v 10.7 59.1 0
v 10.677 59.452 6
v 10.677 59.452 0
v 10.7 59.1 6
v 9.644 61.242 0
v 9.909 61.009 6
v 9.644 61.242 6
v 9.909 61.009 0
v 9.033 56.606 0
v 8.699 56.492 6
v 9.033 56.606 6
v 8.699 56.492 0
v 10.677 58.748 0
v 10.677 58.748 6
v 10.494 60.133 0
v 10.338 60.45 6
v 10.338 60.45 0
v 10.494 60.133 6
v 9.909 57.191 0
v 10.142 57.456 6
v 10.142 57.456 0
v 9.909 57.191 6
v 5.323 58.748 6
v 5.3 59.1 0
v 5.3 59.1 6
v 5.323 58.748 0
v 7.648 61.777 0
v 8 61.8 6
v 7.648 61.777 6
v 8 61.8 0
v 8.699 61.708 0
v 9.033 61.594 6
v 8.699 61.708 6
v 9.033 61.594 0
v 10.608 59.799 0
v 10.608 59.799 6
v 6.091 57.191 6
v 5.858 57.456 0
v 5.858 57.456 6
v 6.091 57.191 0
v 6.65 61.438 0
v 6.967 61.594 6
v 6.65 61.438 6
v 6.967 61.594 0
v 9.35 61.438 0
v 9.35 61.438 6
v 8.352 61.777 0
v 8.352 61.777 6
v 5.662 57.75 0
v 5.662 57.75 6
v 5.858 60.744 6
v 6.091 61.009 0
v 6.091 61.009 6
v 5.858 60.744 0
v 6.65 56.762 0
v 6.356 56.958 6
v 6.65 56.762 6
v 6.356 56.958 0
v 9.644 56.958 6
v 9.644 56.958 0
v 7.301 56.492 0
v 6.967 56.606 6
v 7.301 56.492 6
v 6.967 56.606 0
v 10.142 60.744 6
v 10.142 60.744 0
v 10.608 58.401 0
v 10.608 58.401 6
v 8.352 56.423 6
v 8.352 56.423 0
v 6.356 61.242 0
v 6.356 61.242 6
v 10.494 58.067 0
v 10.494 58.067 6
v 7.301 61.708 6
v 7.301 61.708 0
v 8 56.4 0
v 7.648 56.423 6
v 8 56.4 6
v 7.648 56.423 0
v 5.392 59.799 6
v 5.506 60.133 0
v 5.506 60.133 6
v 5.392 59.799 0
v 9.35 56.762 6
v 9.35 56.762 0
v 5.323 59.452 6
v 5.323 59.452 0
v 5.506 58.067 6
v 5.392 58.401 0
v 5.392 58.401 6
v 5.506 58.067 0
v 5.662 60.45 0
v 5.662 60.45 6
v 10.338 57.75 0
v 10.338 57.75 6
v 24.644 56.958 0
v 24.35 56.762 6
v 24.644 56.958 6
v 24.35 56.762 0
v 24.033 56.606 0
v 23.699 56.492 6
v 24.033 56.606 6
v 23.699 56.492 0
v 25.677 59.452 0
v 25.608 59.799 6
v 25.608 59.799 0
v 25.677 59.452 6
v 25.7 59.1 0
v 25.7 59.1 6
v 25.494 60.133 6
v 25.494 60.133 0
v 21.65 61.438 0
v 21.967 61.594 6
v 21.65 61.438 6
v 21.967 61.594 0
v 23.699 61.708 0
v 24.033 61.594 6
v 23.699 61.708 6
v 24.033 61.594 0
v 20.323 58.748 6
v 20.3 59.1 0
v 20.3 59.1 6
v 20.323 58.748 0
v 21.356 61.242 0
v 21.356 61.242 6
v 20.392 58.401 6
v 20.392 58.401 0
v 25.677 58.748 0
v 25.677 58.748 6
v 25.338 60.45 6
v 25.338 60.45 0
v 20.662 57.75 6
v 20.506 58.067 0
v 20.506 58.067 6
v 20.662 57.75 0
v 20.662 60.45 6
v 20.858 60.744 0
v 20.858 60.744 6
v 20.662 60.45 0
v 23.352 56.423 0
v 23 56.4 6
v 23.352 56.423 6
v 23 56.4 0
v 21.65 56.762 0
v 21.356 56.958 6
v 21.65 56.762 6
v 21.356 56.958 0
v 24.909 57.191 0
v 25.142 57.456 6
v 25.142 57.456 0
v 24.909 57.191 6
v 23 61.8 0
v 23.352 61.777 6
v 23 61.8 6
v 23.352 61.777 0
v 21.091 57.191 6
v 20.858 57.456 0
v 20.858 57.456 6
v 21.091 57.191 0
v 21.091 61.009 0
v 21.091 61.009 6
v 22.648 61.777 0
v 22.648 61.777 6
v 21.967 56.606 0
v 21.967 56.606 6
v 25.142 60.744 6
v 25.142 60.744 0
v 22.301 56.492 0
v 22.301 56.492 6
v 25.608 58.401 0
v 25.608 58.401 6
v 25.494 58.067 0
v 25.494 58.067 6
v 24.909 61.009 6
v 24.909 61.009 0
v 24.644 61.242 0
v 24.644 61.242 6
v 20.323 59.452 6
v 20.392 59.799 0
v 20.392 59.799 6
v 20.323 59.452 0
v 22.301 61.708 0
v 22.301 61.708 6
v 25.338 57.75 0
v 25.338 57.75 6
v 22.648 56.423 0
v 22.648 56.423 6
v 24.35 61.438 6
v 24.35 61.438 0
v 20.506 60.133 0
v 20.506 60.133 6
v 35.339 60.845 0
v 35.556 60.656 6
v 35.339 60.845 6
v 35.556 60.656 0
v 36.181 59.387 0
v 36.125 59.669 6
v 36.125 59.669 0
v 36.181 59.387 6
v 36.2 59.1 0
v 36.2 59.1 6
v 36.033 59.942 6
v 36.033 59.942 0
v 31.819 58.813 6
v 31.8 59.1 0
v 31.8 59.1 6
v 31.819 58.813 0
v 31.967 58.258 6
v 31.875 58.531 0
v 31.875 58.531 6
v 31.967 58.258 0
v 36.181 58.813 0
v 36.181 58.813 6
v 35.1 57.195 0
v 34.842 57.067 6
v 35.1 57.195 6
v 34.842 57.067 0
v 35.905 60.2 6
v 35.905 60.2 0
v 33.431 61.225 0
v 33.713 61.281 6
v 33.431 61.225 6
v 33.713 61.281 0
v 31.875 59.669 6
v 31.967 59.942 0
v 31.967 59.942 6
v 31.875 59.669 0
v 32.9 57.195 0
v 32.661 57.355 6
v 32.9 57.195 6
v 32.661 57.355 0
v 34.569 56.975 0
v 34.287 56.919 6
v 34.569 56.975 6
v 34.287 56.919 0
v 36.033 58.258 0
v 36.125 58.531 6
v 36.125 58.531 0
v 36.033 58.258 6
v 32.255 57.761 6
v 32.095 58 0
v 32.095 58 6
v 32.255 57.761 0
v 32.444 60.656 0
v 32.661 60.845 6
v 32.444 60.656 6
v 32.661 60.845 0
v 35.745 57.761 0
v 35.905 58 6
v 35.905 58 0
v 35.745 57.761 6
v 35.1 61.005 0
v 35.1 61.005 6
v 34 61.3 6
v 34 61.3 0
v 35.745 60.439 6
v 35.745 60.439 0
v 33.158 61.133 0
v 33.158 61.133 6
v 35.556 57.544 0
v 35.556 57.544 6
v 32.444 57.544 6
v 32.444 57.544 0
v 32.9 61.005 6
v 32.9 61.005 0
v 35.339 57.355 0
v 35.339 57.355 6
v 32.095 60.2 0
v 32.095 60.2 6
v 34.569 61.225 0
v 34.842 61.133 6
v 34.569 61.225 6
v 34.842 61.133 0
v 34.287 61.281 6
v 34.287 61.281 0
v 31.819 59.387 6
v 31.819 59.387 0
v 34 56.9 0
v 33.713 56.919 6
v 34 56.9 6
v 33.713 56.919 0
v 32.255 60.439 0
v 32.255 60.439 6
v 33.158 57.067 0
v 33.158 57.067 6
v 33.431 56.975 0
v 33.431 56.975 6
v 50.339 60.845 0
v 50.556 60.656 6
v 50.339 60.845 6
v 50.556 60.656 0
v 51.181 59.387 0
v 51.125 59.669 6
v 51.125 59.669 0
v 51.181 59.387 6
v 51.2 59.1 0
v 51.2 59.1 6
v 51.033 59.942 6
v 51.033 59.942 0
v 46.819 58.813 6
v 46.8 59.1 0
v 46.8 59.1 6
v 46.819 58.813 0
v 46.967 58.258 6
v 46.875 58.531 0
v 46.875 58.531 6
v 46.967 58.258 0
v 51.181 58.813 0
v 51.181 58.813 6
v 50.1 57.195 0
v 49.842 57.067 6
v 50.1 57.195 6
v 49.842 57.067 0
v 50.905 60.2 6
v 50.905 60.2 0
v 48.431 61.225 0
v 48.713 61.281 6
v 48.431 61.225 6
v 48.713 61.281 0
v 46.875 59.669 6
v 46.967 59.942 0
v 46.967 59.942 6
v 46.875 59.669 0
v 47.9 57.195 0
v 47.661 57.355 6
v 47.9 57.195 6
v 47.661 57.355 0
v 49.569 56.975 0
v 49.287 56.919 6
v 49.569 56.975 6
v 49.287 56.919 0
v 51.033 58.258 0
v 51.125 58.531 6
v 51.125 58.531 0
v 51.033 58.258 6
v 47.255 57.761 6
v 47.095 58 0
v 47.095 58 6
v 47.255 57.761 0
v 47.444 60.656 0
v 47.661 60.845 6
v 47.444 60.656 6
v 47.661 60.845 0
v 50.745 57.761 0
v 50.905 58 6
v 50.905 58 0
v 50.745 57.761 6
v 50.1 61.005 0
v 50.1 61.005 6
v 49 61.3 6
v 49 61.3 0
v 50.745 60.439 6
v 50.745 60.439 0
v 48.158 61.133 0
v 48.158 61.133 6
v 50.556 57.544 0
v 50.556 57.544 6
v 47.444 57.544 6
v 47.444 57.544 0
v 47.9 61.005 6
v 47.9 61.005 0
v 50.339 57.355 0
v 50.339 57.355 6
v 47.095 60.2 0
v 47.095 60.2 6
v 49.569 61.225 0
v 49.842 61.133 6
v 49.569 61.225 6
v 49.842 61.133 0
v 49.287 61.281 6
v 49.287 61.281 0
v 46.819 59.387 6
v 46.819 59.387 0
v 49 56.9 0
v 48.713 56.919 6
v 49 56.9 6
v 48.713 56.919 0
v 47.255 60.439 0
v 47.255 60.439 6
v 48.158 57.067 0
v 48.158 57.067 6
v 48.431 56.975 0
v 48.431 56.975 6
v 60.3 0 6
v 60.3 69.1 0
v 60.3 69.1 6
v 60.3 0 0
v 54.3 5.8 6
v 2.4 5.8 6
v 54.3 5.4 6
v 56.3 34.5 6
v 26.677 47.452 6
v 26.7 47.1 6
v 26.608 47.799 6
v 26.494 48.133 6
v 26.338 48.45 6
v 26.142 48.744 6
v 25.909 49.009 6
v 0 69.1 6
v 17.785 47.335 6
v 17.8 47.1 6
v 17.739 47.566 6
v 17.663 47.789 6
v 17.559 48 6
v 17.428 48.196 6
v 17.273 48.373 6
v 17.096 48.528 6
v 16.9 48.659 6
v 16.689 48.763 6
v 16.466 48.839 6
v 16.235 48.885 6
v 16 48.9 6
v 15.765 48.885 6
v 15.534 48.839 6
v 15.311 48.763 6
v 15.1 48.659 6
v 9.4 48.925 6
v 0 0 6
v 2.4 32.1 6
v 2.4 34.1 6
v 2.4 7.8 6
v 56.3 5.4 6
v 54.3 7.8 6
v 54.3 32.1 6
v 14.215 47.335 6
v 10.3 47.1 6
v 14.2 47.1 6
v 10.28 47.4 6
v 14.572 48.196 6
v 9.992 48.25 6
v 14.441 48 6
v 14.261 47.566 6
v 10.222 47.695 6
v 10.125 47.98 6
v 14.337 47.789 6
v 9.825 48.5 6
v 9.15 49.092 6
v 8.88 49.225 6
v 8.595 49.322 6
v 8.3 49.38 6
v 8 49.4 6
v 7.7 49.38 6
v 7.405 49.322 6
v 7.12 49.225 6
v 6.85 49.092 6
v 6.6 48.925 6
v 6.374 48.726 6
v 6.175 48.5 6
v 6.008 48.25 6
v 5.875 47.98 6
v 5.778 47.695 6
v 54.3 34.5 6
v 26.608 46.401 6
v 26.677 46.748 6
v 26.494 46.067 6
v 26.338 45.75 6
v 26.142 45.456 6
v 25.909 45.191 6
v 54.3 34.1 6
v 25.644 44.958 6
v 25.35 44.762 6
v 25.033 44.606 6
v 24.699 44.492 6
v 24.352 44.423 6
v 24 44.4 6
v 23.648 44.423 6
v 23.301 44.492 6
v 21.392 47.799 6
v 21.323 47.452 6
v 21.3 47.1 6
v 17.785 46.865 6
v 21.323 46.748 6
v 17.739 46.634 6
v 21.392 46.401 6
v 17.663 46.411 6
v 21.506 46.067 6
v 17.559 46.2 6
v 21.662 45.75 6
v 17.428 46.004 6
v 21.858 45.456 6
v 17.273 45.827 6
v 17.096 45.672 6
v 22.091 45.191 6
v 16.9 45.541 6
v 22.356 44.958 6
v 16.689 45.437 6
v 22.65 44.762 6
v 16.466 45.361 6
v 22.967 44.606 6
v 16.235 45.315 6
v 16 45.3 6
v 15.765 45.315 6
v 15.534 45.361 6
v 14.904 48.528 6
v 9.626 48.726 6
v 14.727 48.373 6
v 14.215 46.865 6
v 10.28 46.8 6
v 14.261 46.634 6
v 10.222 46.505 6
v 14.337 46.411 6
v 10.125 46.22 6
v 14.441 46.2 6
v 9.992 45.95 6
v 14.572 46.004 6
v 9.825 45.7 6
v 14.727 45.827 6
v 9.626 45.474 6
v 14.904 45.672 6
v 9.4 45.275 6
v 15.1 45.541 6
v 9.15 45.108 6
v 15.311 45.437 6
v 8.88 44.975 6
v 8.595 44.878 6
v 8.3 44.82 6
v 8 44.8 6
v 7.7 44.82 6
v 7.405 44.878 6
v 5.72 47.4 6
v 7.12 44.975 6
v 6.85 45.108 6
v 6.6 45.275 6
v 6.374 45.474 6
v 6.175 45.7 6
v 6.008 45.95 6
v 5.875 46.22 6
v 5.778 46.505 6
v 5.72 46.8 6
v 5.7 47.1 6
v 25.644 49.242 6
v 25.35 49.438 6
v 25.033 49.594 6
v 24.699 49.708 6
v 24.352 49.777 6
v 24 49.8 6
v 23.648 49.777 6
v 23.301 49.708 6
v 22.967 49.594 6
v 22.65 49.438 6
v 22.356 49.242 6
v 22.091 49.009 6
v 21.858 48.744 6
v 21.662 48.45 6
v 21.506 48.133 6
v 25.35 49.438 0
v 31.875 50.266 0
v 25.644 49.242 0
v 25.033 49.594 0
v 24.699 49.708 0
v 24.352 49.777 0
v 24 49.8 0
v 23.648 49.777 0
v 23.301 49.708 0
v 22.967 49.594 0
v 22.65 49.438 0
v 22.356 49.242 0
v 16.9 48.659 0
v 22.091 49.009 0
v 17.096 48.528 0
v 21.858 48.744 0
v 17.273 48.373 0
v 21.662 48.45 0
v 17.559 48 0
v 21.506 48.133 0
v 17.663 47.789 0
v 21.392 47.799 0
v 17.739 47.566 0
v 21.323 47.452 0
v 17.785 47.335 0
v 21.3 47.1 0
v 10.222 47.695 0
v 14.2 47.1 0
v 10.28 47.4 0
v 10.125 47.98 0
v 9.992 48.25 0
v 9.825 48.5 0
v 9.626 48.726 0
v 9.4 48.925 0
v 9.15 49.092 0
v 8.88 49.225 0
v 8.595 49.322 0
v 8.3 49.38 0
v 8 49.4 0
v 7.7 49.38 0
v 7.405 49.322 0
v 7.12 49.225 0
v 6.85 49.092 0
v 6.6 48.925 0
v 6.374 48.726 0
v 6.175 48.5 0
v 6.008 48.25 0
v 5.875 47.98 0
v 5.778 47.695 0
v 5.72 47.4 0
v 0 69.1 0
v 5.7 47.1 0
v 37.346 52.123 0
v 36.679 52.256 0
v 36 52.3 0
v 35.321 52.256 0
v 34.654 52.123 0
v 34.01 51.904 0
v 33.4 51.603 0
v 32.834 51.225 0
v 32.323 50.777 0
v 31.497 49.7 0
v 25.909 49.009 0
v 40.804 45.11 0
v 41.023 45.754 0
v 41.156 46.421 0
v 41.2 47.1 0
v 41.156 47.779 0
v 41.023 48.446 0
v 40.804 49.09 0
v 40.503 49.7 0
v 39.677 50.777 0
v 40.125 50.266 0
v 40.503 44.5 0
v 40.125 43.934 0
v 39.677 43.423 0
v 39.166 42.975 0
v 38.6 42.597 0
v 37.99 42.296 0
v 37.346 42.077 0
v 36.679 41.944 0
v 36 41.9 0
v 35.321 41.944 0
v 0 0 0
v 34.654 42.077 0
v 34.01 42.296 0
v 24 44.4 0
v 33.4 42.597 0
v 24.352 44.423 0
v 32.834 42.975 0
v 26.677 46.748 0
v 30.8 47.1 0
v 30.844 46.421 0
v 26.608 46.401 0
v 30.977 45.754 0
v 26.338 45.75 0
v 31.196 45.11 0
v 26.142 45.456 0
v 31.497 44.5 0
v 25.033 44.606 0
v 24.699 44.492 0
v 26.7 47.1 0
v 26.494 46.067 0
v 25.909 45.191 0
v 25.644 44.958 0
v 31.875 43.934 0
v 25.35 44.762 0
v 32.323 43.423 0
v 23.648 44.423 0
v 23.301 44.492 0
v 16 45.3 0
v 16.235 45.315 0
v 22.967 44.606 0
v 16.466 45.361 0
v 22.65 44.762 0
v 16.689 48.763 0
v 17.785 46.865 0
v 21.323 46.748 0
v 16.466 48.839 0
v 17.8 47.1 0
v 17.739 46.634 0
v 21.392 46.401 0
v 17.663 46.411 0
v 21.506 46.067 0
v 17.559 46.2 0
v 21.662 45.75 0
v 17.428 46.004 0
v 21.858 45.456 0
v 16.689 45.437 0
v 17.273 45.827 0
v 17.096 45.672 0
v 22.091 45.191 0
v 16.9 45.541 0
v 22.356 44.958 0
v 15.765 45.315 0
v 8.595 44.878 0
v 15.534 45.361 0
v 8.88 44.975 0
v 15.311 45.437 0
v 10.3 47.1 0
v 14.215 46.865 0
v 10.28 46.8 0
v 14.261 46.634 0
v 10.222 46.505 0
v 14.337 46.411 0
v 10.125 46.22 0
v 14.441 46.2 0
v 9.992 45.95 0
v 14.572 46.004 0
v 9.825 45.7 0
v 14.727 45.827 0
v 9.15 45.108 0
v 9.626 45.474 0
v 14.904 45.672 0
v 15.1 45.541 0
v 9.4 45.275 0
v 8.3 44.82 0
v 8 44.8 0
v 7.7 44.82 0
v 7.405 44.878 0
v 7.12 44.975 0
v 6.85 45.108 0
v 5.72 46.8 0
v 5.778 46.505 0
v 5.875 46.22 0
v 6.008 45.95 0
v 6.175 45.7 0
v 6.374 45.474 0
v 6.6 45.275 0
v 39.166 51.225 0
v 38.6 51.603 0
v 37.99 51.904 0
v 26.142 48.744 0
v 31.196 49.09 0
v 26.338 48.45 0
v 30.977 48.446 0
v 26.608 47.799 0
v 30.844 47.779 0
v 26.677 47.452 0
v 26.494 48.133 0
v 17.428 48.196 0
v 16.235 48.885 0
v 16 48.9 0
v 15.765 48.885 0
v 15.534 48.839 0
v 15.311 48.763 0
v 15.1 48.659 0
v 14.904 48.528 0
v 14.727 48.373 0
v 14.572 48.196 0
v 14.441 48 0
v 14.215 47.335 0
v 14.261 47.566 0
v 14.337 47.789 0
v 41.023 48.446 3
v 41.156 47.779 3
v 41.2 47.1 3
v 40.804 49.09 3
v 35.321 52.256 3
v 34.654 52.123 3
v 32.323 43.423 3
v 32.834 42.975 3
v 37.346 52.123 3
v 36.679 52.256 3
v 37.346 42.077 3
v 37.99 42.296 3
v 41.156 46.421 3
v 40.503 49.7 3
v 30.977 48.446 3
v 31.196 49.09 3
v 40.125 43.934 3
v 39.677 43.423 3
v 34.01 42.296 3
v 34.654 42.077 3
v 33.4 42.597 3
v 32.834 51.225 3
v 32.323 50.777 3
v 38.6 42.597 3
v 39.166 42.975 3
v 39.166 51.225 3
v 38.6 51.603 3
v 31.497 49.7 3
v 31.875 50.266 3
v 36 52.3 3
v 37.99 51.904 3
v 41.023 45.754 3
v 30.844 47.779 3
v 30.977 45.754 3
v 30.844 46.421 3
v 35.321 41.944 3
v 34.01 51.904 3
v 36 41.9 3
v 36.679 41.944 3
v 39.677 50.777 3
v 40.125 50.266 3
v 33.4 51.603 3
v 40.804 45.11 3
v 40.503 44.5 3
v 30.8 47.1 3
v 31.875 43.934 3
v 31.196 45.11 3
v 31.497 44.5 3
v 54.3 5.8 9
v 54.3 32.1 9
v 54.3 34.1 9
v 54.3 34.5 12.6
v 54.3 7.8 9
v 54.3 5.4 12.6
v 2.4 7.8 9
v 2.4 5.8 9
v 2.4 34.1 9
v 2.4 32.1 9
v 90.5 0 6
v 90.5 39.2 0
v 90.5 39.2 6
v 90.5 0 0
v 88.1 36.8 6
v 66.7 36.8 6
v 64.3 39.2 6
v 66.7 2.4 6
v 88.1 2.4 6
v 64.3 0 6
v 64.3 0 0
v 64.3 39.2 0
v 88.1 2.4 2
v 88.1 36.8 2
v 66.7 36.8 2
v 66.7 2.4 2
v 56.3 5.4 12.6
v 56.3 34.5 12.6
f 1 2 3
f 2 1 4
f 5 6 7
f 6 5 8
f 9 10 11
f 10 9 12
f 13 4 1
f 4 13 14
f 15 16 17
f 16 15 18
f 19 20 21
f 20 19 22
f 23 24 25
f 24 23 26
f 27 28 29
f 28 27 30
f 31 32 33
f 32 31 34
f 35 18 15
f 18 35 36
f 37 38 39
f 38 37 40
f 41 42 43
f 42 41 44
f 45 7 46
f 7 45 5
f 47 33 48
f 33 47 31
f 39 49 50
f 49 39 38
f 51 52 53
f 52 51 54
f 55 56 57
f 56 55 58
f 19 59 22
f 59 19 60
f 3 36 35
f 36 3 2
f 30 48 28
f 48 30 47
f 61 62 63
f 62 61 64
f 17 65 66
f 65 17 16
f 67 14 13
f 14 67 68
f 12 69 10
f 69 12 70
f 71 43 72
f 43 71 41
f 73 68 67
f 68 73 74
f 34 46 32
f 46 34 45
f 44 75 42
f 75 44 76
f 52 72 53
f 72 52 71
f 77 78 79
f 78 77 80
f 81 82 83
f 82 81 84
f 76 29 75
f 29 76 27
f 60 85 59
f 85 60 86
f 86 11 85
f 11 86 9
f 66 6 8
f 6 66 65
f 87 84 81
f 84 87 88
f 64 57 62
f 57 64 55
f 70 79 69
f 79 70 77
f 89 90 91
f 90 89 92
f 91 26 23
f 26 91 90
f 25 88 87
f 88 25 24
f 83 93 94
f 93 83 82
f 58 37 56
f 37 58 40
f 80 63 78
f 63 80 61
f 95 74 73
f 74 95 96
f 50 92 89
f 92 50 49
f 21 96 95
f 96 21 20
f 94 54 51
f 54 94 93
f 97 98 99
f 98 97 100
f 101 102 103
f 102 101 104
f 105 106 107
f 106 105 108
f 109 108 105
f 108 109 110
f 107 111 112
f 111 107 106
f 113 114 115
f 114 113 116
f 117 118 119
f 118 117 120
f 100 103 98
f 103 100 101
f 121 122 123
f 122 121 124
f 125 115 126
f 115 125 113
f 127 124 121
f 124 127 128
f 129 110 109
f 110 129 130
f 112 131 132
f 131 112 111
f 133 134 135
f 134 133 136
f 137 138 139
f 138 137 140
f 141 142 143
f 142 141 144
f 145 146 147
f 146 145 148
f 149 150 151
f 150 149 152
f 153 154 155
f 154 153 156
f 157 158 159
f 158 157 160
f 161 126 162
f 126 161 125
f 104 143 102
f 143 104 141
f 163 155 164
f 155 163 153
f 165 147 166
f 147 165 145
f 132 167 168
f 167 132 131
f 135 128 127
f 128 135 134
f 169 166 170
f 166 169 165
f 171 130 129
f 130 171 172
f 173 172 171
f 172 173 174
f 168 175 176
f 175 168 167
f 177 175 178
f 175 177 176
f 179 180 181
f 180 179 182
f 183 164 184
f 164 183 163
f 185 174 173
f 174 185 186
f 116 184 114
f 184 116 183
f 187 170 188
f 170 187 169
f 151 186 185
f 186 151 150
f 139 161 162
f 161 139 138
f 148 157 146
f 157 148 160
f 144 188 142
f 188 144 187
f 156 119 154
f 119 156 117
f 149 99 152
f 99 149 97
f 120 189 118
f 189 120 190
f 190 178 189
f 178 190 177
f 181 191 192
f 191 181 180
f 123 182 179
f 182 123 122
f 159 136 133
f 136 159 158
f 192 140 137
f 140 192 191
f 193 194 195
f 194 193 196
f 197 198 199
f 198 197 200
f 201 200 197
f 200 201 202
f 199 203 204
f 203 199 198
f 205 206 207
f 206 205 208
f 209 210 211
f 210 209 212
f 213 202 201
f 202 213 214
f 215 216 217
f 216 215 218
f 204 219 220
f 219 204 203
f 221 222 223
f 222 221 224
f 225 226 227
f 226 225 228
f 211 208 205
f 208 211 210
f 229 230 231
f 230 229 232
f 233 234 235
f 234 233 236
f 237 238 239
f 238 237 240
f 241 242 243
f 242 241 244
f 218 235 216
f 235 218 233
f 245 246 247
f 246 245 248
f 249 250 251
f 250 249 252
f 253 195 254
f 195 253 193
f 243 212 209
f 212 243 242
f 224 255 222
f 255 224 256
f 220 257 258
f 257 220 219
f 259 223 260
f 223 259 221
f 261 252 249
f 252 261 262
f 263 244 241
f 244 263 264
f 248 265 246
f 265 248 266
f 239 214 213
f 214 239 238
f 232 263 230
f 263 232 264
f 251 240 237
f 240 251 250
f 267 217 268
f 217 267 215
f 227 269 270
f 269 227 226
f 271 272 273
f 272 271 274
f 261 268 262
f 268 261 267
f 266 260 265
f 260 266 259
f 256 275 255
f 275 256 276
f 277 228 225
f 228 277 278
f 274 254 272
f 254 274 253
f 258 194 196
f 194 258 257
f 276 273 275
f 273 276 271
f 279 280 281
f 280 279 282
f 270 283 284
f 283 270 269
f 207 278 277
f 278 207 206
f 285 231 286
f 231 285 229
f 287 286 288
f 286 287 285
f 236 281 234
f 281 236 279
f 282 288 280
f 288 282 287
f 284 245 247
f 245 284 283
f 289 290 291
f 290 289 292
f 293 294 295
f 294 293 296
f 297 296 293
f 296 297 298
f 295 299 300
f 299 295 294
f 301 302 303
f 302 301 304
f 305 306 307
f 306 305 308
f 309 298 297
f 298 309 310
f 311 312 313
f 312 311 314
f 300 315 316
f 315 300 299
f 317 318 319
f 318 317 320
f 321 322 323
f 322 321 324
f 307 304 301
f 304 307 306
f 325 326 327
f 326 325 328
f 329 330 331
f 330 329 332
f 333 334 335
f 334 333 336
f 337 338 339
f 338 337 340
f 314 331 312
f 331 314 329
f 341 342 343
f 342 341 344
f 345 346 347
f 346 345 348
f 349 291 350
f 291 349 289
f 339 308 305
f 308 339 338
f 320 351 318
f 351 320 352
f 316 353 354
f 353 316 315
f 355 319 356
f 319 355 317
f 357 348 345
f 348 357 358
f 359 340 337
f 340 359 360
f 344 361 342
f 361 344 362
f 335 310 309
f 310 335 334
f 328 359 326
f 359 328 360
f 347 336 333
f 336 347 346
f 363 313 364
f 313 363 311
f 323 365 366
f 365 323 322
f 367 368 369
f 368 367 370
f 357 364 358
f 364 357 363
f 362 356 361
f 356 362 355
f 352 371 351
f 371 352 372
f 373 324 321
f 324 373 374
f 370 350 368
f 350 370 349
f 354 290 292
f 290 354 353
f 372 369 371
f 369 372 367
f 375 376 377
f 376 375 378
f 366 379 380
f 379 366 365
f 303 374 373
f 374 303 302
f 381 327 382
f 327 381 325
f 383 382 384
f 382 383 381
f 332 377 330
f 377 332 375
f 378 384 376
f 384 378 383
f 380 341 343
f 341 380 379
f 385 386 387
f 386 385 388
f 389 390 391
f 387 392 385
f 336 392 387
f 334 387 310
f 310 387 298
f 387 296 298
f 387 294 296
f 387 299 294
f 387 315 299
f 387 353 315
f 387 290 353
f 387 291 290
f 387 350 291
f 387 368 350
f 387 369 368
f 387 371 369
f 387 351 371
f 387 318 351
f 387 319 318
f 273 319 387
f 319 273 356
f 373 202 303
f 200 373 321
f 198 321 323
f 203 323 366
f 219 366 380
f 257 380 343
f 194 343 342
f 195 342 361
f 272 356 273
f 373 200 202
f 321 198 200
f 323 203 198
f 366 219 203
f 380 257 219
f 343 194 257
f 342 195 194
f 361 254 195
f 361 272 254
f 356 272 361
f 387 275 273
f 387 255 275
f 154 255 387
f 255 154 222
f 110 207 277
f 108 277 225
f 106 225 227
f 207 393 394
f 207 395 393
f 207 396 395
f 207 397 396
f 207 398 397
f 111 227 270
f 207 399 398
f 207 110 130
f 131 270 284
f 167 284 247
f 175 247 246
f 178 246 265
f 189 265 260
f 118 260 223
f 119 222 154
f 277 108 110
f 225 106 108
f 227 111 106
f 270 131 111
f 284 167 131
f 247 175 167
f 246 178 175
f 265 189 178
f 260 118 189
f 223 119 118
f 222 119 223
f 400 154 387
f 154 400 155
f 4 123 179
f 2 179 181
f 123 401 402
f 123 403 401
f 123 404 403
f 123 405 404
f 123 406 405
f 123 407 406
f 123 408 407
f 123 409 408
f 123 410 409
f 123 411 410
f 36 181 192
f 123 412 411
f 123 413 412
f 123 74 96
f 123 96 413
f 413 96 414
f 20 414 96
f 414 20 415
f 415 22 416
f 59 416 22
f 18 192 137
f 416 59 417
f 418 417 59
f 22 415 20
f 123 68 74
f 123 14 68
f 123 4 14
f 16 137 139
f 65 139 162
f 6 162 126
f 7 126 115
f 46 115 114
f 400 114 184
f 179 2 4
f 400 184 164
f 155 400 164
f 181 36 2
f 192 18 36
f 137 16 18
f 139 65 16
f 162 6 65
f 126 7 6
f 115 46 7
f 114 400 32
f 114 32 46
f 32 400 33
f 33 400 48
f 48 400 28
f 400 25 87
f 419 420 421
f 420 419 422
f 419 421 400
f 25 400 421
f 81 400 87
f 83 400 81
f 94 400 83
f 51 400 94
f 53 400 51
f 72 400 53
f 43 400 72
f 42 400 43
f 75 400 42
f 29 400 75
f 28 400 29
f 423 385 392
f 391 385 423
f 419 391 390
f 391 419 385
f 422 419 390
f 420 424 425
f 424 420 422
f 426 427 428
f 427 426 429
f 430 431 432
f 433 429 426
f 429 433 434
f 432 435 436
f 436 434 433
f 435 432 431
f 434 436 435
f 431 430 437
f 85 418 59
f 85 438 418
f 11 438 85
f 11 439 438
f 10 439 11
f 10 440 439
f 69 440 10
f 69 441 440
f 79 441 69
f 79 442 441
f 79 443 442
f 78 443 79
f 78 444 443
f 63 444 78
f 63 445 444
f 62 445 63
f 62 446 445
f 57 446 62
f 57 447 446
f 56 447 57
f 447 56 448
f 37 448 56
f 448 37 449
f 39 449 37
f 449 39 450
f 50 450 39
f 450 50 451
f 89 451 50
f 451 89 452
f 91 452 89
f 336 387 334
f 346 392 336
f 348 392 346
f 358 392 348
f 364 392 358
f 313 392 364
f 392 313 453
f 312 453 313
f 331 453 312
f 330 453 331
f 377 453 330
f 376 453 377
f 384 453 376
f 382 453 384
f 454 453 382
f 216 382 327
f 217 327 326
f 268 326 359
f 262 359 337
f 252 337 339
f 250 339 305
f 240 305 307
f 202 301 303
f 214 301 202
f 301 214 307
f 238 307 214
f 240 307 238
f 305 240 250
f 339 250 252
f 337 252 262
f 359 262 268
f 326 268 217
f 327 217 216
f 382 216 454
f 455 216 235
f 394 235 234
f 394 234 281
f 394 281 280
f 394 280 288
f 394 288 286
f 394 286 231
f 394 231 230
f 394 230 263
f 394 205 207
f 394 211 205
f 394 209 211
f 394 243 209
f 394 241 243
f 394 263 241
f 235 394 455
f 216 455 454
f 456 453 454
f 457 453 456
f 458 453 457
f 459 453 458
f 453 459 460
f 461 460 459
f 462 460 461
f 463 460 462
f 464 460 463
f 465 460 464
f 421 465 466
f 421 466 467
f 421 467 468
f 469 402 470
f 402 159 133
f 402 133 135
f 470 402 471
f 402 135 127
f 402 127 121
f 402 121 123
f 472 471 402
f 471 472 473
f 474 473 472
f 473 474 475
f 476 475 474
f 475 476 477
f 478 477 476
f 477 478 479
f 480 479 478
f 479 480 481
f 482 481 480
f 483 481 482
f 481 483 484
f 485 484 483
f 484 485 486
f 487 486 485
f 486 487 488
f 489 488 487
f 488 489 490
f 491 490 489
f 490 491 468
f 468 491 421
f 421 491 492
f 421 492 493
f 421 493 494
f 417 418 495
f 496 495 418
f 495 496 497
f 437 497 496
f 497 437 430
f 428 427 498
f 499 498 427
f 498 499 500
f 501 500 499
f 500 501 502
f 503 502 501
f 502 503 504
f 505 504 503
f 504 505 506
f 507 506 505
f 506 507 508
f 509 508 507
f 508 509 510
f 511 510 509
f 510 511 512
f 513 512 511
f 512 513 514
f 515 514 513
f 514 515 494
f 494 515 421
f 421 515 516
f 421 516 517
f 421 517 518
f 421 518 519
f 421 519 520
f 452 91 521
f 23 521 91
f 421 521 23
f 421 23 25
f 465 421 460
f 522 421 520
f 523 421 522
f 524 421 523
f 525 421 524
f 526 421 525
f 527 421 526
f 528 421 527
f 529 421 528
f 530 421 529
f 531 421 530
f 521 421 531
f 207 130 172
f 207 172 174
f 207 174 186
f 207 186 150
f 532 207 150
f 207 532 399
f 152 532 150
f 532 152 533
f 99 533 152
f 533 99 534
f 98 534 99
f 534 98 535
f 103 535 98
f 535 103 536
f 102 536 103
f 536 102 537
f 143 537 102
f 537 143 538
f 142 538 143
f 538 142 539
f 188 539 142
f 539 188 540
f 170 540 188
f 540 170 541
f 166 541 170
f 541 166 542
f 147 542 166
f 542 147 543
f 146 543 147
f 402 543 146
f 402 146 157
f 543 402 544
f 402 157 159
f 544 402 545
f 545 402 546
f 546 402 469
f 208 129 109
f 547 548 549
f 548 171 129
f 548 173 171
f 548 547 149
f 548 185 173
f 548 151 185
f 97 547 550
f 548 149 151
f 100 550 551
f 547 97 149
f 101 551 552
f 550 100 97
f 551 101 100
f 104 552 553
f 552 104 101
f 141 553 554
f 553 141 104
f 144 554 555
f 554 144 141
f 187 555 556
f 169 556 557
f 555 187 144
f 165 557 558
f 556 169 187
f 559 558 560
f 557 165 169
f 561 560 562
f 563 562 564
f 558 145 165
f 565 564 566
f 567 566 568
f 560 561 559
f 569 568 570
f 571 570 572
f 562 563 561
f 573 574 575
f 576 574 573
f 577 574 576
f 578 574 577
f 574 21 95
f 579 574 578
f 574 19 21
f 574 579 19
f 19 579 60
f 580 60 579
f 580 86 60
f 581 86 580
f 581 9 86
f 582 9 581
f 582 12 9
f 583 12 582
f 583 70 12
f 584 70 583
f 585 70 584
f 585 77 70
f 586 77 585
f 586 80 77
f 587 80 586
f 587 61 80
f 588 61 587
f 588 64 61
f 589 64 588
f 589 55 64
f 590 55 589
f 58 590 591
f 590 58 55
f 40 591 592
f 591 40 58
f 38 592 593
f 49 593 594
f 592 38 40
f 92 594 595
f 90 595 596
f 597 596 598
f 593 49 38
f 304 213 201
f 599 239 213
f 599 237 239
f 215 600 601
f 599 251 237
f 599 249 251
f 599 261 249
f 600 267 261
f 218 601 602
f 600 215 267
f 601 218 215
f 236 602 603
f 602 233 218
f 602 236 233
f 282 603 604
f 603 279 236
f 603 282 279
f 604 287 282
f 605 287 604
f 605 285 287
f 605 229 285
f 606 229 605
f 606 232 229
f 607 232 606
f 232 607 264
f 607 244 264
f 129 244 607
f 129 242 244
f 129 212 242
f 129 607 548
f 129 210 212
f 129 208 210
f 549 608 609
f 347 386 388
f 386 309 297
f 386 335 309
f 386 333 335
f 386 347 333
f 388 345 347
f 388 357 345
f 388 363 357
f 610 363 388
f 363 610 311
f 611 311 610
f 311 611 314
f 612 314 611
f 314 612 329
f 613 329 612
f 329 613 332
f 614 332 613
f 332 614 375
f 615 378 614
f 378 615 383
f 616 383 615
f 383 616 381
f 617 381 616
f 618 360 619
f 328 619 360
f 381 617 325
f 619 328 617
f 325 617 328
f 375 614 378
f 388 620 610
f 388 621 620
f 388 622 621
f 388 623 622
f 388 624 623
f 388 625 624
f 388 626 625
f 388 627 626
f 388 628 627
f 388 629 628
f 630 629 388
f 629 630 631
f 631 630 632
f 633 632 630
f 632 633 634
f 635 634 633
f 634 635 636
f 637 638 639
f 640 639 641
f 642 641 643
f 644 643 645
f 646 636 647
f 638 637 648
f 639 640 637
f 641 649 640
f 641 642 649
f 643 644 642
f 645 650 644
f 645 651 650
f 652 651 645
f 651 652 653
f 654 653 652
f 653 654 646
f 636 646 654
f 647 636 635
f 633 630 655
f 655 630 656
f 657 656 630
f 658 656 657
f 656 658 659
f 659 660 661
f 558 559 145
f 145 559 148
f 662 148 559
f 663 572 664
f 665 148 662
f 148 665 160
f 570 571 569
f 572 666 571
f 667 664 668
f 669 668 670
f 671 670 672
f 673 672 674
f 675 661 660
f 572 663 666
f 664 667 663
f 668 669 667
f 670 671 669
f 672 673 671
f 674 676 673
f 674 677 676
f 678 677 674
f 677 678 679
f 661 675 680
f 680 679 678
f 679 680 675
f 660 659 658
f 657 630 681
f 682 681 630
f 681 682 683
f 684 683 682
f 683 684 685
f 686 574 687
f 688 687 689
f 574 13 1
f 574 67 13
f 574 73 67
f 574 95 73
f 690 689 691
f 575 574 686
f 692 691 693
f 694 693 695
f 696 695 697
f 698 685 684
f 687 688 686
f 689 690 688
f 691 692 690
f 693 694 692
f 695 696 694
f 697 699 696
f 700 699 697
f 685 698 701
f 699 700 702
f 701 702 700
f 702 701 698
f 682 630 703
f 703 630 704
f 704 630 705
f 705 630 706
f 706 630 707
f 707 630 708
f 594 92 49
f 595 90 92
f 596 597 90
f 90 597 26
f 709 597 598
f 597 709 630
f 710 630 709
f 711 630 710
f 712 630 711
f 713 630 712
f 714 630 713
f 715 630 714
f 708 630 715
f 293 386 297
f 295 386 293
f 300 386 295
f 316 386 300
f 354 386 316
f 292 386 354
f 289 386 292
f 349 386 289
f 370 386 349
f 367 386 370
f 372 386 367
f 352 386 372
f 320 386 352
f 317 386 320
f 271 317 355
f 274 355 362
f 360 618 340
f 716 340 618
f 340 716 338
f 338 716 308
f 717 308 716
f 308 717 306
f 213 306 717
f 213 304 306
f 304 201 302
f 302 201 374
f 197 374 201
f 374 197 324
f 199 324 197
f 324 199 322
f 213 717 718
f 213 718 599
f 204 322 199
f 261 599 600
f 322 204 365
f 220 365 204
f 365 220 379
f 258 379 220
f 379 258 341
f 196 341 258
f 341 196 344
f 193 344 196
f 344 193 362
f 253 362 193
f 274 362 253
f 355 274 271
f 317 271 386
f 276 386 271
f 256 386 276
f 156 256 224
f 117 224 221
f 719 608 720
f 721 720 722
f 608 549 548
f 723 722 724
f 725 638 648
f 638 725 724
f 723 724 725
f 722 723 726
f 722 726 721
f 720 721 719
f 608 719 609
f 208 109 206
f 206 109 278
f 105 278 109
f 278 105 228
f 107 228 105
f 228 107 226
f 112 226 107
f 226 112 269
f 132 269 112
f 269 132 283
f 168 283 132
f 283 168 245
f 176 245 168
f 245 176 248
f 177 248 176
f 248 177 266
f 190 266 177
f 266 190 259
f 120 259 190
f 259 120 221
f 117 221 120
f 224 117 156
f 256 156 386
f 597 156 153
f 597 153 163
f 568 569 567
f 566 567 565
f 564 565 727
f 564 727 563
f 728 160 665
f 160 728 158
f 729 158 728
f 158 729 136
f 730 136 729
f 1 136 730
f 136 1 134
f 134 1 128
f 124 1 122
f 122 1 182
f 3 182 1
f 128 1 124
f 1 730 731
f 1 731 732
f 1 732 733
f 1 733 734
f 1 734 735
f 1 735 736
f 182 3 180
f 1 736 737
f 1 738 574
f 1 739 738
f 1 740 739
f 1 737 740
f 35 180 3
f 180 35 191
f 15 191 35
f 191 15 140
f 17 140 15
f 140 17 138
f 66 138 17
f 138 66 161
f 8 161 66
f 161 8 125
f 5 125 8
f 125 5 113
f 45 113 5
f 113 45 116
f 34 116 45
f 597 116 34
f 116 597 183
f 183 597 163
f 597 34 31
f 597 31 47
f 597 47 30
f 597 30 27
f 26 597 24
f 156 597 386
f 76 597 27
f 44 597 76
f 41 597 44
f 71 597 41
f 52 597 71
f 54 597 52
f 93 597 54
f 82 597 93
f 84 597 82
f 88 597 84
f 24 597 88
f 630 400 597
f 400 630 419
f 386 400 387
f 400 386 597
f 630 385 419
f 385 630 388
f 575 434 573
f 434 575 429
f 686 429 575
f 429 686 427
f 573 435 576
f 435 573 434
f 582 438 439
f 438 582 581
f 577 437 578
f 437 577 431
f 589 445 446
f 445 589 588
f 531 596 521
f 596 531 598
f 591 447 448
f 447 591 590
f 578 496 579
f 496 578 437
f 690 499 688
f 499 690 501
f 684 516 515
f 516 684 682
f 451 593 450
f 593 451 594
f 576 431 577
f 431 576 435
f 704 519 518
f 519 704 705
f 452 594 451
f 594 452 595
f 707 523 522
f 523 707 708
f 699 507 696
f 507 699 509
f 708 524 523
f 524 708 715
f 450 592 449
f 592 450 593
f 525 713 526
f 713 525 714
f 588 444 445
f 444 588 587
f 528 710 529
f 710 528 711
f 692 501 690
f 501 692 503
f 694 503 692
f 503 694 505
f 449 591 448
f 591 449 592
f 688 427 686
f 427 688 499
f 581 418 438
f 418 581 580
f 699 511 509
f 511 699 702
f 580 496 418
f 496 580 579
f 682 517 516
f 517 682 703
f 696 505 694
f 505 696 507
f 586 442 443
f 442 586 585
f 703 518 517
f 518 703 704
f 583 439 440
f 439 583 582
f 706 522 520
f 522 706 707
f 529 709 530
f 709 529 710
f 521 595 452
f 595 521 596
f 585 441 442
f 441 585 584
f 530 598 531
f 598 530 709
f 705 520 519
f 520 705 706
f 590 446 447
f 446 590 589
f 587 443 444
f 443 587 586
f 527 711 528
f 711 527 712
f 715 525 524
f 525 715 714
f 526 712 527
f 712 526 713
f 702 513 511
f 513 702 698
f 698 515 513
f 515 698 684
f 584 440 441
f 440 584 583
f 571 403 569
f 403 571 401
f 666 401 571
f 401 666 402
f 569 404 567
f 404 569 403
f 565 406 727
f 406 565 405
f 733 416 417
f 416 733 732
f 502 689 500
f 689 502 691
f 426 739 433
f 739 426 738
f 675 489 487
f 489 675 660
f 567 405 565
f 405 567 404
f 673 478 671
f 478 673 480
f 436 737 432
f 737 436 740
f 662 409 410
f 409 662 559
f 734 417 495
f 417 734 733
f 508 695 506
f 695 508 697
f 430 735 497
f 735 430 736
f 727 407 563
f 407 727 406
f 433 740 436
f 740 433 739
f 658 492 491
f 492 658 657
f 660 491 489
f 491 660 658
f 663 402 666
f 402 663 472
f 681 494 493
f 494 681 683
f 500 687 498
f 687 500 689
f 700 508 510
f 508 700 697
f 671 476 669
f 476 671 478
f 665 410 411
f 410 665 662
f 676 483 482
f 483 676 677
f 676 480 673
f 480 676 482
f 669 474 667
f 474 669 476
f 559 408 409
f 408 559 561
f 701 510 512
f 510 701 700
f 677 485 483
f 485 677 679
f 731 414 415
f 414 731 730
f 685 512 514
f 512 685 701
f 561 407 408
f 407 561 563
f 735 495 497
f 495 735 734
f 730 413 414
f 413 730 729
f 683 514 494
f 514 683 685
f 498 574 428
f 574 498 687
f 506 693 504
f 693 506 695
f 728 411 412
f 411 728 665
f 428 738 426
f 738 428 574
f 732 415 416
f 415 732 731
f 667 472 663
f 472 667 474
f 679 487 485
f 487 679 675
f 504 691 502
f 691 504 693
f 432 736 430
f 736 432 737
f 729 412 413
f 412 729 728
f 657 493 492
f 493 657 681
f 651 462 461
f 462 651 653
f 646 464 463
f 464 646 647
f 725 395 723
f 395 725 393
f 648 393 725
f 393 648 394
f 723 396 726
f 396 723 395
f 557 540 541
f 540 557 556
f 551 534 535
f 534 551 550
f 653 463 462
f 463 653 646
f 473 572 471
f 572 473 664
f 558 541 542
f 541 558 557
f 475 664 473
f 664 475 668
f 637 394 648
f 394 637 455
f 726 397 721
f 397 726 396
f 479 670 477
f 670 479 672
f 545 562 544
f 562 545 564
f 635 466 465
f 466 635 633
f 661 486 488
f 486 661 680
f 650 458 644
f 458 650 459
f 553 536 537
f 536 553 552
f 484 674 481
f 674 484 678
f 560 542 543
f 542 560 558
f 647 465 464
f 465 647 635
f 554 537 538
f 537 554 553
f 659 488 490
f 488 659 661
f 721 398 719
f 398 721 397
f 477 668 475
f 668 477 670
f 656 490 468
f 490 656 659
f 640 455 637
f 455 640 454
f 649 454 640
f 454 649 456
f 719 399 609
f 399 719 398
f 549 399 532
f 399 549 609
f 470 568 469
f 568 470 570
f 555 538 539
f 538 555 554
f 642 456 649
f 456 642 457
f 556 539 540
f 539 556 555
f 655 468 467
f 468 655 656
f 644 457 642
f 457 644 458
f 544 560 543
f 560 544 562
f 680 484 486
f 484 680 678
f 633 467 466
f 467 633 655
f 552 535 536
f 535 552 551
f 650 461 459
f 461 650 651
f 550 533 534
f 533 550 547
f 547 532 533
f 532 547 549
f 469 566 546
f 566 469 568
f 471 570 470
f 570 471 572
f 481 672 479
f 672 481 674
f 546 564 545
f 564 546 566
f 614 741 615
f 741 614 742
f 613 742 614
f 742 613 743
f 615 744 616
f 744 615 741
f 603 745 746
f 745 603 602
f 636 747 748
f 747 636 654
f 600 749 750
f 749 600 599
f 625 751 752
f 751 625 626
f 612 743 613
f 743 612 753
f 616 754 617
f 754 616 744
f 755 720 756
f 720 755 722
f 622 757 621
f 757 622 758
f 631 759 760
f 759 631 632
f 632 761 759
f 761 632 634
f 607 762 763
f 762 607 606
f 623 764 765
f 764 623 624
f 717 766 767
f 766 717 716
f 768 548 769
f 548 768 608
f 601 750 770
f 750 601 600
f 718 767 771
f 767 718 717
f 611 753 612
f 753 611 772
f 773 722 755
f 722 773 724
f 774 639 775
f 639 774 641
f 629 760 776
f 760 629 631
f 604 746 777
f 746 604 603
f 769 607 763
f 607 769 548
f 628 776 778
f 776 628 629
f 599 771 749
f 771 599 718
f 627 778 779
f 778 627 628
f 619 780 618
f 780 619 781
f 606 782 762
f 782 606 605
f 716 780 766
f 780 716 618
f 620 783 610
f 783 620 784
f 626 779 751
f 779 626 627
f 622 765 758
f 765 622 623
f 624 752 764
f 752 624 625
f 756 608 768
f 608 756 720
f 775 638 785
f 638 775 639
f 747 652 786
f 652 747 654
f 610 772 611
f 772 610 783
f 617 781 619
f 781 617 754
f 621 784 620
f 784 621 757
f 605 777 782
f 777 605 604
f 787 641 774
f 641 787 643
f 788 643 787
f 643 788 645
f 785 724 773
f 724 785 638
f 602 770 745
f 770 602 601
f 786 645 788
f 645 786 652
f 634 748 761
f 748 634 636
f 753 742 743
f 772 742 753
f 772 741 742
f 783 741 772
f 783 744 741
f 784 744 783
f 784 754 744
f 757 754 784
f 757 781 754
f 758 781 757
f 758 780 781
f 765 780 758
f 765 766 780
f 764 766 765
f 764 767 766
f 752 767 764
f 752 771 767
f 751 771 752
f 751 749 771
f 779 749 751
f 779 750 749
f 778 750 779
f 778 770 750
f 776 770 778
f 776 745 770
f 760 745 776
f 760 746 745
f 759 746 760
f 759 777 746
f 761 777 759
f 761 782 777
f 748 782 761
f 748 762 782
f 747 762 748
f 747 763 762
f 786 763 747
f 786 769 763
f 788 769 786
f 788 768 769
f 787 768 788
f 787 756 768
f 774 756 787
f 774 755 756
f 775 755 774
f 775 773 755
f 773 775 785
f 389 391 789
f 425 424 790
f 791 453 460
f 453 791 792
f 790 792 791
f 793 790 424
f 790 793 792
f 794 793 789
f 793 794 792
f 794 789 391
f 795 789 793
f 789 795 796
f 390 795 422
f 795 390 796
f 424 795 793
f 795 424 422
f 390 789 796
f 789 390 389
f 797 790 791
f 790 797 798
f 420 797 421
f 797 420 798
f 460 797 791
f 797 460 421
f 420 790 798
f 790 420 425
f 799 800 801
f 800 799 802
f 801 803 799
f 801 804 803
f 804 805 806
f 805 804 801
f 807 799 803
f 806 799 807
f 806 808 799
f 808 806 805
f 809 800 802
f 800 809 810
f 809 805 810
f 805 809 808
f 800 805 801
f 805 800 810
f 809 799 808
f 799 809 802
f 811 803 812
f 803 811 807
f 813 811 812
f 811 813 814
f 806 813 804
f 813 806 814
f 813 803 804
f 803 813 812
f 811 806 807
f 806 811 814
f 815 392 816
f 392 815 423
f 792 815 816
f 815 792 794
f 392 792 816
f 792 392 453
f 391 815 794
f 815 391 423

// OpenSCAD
// file: params.scad
// Every measurement of the parts the enclosures hold, in millimetres, in one place. The values come from the sellers' sheets of the parts in
// docs/hardware.md; measure the parts you received with a caliper and change them here before the final print (print fit_test.scad first).

$fn = 48;

// Fit and print
clearance = 0.4;        // gap around a part so it slides in
wall = 2.4;             // six perimeters of a 0.4 mm nozzle
floor_thickness = 2.0;
lid_thickness = 2.0;
lip = 1.6;              // height of the lid's inner lip

// ESP32 DevKit V1 (ESP-WROOM-32). The 30-pin board is 51.5 x 28.3; the 38-pin one is 55.3 x 28.3.
esp32_length = 51.5;
esp32_width = 28.3;
esp32_pcb = 1.6;
esp32_under = 9.0;      // header pins and solder below the board, so it rests on its edges
esp32_above = 6.0;      // the WROOM can and the buttons
usb_width = 12.0;       // opening for a micro-USB or USB-C plug with its overmould
usb_height = 8.0;

// HX711 module (green board)
hx711_length = 34.0;
hx711_width = 21.0;
hx711_height = 4.0;

// Perfboard with the buzzer transistor and the resistors
perf_length = 40.0;
perf_width = 30.0;

// Active buzzer, 12 x 9.5 mm
buzzer_diameter = 12.0;
buzzer_height = 9.5;

// RGB LED, 5 mm (10 mm: change to 10.0)
led_diameter = 5.0;

// Cables
probe_cable = 4.2;      // DS18B20 waterproof probe cable
reed_cable = 3.2;       // MC-38 cable

// Load cell, 5 kg bar (TAL220 type): two M5 holes at one end, two M4 at the other, 15 mm apart, 5 mm from each end
cell_length = 80.0;
cell_section = 12.7;
cell_hole_spacing = 15.0;
cell_hole_from_end = 5.0;
m4 = 4.4;
m5 = 5.4;
m3 = 3.3;

// MC-38 reed switch and its magnet
reed_length = 27.0;
reed_width = 14.0;
reed_height = 8.0;
magnet_length = 27.0;
magnet_width = 10.0;
magnet_height = 8.0;

// Mounting
disc_magnet_diameter = 10.0;   // 10 x 3 mm neodymium discs
disc_magnet_height = 3.0;
rubber_foot = 8.0;             // adhesive rubber bumpers
// main file
// Print this first and try the real parts in it: the ESP32 on its rails, the HX711 in its slot, the probe and reed cables
// in the gland holes, the LED in its window, the load cell bolts in both hole sizes and a disc magnet in its pocket. Change params.scad
// until everything fits, then print the enclosures.

include <params.scad>

difference() {
  cube([esp32_length + 2 * wall + 4, esp32_width + 2 * wall + 6 + 30, floor_thickness + 4]);
  // Gland holes, LED window and magnet pocket
  translate([8, esp32_width + 2 * wall + 14, -1]) cylinder(d = probe_cable + clearance, h = 10);
  translate([16, esp32_width + 2 * wall + 14, -1]) cylinder(d = reed_cable + clearance, h = 10);
  translate([24, esp32_width + 2 * wall + 14, -1]) cylinder(d = led_diameter + clearance, h = 10);
  translate([36, esp32_width + 2 * wall + 14, -1]) cylinder(d = disc_magnet_diameter + clearance, h = 1 + disc_magnet_height);
  // Load cell hole pattern, M5 and M4
  for (i = [0, 1]) translate([8 + i * cell_hole_spacing, esp32_width + 2 * wall + 26, -1]) cylinder(d = m5, h = 10);
  for (i = [0, 1]) translate([34 + i * cell_hole_spacing, esp32_width + 2 * wall + 26, -1]) cylinder(d = m4, h = 10);
}
// ESP32 rails with the end stop, as in the door node
for (y = [0, esp32_width - 2]) translate([wall, wall + 3 + clearance + y, floor_thickness + 4]) cube([esp32_length + clearance, 2, 3]);
translate([wall + esp32_length + clearance, wall + 3, floor_thickness + 4]) cube([2, esp32_width + 2 * clearance, 3 + esp32_pcb + 2]);
// HX711 slot
translate([esp32_length + 2 * wall + 8, 0, 0]) difference() {
  cube([hx711_width + 2 * wall + clearance, hx711_length + 2 * wall + clearance, floor_thickness + 4]);
  translate([wall, wall, floor_thickness]) cube([hx711_width + clearance, hx711_length + clearance, 10]);
}
